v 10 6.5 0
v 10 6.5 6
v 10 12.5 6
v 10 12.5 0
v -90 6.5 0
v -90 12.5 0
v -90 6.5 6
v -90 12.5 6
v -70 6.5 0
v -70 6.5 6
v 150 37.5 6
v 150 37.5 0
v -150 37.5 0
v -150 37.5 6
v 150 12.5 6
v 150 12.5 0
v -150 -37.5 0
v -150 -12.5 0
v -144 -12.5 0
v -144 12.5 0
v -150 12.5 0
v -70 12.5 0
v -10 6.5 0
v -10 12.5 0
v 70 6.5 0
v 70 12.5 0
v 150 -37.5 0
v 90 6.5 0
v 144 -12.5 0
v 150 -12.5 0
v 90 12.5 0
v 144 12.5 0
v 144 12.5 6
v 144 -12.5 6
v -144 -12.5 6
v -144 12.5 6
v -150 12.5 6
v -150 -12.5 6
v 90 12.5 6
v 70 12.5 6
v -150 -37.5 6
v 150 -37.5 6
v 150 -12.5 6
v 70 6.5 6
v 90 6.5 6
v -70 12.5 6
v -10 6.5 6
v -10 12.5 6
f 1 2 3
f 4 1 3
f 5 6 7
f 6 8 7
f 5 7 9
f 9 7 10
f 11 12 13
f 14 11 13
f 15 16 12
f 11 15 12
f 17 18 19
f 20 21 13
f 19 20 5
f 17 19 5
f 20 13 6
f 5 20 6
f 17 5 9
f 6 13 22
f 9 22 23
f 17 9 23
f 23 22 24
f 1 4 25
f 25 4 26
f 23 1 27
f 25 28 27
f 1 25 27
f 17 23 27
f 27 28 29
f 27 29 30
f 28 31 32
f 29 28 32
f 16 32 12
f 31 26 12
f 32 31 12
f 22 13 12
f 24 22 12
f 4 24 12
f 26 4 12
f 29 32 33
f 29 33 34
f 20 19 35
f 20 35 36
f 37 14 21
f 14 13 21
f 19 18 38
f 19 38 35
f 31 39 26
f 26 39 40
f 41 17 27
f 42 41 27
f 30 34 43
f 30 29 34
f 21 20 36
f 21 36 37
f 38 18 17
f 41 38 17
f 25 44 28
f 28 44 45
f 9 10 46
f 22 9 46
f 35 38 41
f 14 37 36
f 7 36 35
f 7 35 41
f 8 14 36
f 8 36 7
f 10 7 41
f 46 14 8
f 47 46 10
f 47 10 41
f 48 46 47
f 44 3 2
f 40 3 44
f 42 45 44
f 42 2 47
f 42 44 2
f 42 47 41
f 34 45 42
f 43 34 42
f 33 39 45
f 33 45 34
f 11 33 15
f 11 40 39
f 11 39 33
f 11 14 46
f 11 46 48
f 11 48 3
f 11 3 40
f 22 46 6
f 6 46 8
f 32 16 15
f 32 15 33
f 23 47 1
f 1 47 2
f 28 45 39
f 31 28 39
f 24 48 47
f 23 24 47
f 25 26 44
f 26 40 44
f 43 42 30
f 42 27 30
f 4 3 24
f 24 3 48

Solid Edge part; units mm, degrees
sketch "Sketch1" plane through (0, 0, 0) normal (0, 0, 1) x (1, 0, 0)
  line L0 (-150, -37.5) -> (150, -37.5)
  line L1 (150, -37.5) -> (150, -12.5)
  line L2 (144, -12.5) -> (150, -12.5)
  line L3 (144, 12.5) -> (144, -12.5)
  line L4 (150, 12.5) -> (144, 12.5)
  line L5 (150, 12.5) -> (150, 37.5)
  line L6 (150, 37.5) -> (-150, 37.5)
  line L7 (-150, 37.5) -> (-150, 12.5)
  line L8 (-144, 12.5) -> (-150, 12.5)
  line L9 (-144, -12.5) -> (-144, 12.5)
  line L10 (-150, -12.5) -> (-144, -12.5)
  line L11 (-150, -12.5) -> (-150, -37.5)
  dimension "D1" = 25
  dimension "D2" = 25
  dimension "D3" = 25
  dimension "D4" = 25
extrude "Protrusion1" add sketch "Sketch1" along normal blind 6
sketch "Sketch2" plane through (0, 0, 6) normal (0, 0, 1) x (1, 0, 0)
  line L0 (-90, 6.5) -> (-70, 6.5)
  line L1 (-70, 6.5) -> (-70, 12.5)
  line L2 (-70, 12.5) -> (-90, 12.5)
  line L3 (-90, 12.5) -> (-90, 6.5)
  line L4 (-10, 6.5) -> (10, 6.5)
  line L5 (10, 6.5) -> (10, 12.5)
  line L6 (10, 12.5) -> (-10, 12.5)
  line L7 (-10, 12.5) -> (-10, 6.5)
  line L8 (70, 6.5) -> (90, 6.5)
  line L9 (90, 6.5) -> (90, 12.5)
  line L10 (90, 12.5) -> (70, 12.5)
  line L11 (70, 12.5) -> (70, 6.5)
  dimension "D1" = 54
  dimension "D2" = 25
  dimension "D3" = 6
  dimension "D4" = 20
  dimension "D5" = 6
  dimension "D6" = 20
  dimension "D7" = 6
  dimension "D8" = 20
  dimension "D9" = 25
  dimension "D10" = 60
  dimension "D11" = 25
  dimension "D12" = 54
extrude "Cutout1" cut sketch "Sketch2" against normal through all
